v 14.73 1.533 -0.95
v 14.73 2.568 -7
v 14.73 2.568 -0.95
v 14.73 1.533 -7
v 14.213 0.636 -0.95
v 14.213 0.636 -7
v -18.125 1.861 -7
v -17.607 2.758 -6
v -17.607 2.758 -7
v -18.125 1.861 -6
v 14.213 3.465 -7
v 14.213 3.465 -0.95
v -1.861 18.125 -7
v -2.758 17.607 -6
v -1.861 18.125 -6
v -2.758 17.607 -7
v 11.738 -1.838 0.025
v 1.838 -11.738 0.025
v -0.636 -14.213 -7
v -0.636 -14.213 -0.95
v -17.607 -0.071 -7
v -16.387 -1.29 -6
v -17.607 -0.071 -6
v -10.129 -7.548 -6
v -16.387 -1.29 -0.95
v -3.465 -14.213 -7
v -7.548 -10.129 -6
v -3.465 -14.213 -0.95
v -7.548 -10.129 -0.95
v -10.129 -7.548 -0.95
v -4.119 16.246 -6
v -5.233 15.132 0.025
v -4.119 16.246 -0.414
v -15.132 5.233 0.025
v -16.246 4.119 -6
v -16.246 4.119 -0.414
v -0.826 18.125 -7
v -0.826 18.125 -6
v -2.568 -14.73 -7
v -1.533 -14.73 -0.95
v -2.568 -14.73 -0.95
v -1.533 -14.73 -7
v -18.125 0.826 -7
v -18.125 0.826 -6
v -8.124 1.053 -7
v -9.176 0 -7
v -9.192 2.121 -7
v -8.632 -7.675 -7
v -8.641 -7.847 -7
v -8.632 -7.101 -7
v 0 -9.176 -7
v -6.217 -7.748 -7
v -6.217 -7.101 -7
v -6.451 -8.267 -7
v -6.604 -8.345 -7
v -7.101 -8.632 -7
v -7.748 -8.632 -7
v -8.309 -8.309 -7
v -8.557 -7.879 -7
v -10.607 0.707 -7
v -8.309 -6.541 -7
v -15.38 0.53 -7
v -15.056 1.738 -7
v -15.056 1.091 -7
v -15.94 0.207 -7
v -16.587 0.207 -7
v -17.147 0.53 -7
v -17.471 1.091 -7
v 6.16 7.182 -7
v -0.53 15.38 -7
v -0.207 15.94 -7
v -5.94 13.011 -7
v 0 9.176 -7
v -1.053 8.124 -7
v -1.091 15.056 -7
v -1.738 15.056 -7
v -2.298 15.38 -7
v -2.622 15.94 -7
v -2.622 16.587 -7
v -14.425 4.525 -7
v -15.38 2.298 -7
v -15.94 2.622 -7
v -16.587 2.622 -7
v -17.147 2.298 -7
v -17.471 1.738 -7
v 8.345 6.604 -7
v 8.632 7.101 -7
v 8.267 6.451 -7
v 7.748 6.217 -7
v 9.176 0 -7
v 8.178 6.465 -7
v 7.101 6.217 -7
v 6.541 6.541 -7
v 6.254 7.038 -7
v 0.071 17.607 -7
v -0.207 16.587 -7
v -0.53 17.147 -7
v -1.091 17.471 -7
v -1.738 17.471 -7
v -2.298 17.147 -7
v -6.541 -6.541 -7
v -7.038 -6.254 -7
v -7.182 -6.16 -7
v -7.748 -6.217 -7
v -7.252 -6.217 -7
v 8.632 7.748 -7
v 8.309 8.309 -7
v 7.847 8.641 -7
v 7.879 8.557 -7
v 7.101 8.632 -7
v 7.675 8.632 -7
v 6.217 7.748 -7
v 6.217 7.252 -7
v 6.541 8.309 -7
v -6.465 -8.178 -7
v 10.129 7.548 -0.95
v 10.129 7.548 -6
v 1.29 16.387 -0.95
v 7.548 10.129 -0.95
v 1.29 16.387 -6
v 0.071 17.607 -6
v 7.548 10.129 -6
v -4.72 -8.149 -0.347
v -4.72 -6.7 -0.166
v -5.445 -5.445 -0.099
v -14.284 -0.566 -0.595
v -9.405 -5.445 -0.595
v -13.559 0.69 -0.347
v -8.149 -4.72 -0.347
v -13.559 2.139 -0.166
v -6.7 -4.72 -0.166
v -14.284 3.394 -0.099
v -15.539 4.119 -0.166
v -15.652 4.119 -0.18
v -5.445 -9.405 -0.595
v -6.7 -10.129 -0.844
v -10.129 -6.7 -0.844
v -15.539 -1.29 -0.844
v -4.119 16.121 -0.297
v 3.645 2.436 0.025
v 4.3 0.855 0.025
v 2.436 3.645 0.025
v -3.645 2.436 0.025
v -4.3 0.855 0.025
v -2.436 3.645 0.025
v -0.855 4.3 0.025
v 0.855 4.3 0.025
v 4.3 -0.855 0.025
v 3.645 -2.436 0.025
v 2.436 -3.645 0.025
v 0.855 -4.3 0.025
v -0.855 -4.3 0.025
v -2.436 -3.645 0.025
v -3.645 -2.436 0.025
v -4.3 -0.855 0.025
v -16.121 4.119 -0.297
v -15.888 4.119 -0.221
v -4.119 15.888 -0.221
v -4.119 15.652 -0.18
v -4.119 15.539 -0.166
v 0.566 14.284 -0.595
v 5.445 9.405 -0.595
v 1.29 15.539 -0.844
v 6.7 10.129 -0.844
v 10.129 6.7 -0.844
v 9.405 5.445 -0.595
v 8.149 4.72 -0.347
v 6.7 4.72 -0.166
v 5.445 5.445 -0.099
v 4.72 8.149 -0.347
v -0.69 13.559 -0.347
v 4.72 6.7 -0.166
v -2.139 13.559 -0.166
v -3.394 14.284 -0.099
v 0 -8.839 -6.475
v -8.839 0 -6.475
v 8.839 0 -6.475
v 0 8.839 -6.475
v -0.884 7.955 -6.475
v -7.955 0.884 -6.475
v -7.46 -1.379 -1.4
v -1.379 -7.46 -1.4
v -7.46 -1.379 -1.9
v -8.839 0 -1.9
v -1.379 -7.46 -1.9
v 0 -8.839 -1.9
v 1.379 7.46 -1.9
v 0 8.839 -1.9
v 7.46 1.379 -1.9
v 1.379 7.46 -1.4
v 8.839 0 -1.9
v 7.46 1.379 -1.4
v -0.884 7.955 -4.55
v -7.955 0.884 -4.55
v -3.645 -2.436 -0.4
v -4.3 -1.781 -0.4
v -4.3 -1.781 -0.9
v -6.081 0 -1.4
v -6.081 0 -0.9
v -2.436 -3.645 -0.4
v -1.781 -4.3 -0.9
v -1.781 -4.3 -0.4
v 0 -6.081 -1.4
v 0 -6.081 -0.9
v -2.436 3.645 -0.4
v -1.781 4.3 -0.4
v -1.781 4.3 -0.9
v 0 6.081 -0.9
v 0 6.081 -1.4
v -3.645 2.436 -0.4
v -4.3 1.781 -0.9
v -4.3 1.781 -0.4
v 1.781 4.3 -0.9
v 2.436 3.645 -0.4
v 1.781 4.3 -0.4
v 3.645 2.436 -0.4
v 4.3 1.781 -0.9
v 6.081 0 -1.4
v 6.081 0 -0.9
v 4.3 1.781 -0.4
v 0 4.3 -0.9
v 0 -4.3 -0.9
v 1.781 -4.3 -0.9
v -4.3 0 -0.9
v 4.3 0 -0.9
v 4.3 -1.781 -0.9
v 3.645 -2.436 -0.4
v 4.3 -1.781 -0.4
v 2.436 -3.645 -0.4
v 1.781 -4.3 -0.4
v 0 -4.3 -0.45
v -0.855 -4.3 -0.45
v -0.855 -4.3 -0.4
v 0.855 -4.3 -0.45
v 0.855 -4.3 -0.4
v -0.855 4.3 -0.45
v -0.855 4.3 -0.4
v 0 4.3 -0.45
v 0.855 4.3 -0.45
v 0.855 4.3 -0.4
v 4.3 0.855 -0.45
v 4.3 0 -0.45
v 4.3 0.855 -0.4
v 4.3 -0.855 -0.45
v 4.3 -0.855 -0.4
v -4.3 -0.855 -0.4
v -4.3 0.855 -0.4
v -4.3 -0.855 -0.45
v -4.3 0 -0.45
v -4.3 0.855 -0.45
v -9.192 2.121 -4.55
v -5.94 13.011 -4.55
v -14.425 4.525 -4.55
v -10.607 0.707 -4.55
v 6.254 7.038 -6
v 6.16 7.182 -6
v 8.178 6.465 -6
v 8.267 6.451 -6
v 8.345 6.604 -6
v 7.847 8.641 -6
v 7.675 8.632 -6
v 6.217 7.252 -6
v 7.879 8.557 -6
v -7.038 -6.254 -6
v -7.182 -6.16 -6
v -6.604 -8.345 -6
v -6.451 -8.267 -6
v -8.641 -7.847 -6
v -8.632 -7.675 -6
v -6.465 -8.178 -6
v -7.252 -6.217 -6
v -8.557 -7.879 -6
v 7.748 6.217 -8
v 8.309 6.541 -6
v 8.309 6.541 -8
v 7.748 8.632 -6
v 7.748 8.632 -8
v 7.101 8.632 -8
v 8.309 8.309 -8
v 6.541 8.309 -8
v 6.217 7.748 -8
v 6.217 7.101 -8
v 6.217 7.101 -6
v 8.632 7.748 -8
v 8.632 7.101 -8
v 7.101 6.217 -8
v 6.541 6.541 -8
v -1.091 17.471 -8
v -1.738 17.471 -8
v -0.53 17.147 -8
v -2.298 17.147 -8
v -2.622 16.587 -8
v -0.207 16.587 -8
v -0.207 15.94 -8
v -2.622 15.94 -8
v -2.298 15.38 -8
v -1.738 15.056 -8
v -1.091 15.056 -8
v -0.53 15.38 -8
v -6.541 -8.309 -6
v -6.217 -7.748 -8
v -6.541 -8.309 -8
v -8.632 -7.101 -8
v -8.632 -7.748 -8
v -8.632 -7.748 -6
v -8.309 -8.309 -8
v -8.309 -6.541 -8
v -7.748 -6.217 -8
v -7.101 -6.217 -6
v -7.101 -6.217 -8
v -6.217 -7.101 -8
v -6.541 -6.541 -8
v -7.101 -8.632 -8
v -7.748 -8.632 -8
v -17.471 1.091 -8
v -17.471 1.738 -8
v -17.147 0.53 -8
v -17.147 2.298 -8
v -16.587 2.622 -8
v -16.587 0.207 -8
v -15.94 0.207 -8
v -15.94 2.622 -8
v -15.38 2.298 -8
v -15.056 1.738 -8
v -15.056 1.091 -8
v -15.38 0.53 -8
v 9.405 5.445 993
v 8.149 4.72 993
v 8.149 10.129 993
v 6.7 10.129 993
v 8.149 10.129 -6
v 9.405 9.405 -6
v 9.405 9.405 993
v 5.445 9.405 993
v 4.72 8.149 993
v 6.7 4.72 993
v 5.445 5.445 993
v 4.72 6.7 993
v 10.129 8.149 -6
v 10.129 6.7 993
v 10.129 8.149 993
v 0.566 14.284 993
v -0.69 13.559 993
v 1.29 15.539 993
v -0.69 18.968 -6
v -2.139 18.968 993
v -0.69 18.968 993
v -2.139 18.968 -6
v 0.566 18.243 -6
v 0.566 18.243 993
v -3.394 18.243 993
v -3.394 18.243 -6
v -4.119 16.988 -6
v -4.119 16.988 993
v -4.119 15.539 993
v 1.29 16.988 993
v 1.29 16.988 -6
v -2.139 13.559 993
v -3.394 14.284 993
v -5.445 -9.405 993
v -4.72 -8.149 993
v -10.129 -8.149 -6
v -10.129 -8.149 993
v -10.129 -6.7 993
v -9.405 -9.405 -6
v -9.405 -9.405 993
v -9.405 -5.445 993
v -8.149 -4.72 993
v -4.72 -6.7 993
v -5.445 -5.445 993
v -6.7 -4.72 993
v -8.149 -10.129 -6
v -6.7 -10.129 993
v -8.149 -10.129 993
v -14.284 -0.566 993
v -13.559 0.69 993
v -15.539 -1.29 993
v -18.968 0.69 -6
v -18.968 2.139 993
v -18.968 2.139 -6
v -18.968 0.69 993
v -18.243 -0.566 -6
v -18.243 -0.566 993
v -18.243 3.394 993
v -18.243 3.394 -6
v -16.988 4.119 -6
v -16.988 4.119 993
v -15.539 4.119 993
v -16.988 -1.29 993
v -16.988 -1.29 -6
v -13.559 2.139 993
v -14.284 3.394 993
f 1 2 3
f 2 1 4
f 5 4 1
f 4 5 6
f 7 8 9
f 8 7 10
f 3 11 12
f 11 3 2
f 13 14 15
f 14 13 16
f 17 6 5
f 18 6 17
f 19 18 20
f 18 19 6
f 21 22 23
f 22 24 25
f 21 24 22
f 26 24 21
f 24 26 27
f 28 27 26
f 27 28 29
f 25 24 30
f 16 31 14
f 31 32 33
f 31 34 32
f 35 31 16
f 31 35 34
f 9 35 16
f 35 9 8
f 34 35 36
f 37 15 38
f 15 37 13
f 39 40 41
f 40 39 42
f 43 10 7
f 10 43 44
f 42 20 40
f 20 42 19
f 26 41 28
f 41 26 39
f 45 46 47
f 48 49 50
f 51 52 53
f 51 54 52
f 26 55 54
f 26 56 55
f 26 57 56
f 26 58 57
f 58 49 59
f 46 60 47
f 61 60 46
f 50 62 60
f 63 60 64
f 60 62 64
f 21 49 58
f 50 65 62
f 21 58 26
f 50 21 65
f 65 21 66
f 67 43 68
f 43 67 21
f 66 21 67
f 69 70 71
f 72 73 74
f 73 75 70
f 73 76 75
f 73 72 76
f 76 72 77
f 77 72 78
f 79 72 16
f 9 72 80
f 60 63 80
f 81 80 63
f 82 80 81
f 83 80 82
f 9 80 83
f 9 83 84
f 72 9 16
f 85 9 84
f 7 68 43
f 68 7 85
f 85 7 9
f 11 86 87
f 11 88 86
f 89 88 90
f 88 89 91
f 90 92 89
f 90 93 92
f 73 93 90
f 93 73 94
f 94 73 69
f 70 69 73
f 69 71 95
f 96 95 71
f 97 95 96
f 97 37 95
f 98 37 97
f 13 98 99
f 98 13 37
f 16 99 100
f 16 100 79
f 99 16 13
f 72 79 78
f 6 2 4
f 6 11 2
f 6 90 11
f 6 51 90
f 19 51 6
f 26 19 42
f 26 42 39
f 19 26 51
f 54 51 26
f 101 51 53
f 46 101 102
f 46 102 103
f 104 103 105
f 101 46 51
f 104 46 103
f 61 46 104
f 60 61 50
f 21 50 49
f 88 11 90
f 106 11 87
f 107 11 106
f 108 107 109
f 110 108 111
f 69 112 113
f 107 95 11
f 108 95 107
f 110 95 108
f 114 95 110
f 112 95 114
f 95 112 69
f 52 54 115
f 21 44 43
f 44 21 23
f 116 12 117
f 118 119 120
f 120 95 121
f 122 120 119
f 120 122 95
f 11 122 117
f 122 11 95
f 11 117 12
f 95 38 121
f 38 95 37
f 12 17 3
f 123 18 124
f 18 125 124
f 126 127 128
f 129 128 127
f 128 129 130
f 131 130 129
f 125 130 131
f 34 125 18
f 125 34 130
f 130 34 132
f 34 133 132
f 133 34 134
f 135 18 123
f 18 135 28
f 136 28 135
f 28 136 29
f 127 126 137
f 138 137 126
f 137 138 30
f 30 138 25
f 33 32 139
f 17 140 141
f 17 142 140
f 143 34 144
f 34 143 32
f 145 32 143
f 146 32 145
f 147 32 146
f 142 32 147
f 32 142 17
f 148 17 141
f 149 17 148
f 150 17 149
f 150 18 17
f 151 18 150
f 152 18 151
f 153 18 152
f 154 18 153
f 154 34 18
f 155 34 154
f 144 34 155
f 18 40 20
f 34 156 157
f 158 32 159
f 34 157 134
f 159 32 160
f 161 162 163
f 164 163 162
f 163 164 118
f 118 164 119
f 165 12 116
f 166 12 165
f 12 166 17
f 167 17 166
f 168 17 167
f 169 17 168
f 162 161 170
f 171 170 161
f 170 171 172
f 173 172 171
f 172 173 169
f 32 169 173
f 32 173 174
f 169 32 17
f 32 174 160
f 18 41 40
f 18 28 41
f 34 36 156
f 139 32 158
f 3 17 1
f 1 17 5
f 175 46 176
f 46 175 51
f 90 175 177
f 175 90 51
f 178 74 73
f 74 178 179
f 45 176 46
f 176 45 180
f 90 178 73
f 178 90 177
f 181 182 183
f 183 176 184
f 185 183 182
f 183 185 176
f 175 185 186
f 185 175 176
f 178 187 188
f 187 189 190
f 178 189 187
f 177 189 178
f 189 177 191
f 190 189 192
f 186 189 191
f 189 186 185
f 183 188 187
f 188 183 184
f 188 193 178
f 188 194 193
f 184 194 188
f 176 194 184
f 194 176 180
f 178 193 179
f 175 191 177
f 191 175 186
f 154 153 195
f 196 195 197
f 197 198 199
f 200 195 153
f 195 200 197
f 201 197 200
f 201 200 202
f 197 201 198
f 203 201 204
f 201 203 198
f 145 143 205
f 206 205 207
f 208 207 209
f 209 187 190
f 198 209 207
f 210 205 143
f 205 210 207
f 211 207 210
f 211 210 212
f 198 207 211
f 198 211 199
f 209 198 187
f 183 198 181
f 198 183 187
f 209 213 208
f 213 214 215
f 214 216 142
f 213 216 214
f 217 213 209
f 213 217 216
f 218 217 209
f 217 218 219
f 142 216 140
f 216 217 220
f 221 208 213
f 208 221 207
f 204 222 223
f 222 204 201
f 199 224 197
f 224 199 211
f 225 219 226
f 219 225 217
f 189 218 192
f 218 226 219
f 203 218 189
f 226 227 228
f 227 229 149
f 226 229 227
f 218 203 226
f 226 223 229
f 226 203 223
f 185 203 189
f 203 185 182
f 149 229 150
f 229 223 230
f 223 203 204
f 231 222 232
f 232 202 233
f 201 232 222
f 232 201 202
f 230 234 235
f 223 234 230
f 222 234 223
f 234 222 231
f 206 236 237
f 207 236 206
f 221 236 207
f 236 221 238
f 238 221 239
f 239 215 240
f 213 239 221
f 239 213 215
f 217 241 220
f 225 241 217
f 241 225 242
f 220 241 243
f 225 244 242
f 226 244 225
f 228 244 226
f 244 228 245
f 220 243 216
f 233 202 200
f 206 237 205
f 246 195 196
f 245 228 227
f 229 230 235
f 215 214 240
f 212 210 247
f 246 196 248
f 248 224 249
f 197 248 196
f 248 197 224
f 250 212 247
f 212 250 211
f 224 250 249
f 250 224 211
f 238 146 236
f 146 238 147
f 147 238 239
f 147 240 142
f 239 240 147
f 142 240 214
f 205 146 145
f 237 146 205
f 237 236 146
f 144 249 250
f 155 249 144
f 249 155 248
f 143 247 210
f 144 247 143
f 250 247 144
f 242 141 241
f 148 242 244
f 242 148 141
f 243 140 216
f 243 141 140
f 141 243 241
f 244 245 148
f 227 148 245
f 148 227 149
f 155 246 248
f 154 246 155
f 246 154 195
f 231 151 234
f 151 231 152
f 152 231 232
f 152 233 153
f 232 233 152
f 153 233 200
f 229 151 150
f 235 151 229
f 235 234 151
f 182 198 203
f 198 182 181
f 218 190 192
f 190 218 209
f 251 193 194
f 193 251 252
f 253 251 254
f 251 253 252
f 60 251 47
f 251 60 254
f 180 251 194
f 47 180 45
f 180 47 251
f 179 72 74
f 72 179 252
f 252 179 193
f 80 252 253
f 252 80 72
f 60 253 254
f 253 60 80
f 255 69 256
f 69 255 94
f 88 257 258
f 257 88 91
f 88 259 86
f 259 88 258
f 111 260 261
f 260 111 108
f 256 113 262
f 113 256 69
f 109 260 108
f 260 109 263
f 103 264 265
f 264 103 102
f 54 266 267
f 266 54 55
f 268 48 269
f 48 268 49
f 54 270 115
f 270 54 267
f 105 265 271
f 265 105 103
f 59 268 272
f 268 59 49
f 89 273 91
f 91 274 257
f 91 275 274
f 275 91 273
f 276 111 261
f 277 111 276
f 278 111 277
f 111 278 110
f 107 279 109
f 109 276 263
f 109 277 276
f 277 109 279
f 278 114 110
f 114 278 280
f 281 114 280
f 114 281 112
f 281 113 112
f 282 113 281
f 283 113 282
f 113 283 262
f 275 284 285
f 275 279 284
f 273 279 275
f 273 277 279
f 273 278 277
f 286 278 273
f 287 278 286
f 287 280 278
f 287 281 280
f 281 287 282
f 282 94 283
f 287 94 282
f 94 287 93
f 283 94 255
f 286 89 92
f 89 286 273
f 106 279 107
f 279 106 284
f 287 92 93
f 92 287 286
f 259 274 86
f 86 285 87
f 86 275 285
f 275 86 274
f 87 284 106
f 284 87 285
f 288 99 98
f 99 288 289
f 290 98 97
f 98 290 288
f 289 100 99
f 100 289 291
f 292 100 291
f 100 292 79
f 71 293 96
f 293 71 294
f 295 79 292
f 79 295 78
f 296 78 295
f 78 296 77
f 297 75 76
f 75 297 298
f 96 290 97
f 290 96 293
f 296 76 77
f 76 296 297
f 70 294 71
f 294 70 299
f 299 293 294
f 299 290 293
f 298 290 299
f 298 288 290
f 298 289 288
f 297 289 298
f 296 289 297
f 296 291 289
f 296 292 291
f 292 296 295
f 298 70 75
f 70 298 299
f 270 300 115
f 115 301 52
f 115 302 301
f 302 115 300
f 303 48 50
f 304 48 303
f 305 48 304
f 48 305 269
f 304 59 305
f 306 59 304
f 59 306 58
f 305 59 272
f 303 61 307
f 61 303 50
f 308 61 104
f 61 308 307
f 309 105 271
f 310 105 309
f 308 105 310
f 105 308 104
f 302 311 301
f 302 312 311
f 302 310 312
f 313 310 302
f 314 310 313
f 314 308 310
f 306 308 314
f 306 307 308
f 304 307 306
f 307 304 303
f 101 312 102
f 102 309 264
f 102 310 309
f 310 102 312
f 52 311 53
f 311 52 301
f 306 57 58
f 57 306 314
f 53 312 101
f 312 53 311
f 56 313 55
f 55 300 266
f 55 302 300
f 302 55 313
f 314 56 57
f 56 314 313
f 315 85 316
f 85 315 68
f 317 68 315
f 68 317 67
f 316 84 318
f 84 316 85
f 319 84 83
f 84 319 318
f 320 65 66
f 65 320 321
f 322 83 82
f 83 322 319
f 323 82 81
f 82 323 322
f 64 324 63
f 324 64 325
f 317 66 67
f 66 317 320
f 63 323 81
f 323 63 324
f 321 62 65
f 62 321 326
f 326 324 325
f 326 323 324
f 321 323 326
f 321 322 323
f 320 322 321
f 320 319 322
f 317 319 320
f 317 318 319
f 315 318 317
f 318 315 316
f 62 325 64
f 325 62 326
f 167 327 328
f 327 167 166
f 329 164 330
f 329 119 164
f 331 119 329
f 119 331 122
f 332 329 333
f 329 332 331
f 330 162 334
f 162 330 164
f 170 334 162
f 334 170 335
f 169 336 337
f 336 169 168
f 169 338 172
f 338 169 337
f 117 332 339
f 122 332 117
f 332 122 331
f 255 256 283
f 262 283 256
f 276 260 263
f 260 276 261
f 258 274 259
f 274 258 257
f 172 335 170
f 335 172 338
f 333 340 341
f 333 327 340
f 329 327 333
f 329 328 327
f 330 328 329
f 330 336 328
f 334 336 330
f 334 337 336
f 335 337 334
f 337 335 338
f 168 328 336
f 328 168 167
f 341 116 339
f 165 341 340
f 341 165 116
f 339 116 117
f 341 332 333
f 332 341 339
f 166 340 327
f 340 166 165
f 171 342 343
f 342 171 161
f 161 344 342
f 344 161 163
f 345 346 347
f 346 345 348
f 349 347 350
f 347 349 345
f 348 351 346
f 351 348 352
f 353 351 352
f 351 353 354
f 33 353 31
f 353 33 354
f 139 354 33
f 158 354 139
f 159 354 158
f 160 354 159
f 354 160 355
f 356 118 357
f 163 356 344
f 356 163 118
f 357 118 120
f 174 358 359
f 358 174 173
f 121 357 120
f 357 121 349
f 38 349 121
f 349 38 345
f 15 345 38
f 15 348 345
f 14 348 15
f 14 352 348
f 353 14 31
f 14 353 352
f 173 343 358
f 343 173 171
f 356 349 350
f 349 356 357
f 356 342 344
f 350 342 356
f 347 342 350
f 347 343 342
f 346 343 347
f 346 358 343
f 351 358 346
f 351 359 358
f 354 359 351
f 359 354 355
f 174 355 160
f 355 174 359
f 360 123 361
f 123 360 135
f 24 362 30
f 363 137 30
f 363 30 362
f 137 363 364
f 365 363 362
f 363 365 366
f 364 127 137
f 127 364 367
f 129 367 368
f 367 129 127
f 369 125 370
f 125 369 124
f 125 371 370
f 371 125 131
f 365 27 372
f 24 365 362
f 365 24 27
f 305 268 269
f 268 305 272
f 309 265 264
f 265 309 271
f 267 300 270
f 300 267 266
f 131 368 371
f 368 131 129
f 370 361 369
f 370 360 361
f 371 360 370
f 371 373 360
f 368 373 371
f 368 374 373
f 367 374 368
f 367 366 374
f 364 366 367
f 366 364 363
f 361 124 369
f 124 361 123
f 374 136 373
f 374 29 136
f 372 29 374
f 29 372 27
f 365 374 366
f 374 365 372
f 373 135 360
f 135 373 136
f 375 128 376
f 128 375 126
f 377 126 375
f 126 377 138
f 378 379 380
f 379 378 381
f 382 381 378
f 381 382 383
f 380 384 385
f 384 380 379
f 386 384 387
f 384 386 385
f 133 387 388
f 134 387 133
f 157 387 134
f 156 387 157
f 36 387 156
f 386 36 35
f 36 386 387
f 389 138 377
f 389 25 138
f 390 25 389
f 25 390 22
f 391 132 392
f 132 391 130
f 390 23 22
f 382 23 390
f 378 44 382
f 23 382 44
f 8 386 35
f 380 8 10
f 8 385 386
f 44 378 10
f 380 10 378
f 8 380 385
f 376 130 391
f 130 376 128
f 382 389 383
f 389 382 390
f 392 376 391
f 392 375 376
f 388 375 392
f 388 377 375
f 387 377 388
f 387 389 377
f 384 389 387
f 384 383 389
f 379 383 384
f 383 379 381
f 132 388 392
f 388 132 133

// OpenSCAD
// file: ../libdict.scad
// This library add dictionary like features to openscad
// the dictionary is a list of pairs as we cannot define new types.
// Unlike a python dictionary we cannot do a proper hash table for speed
// so everything is build around the OpenSCAD search function
// There are a lot of assert statements to ensure data in the "dictionary"
// is in the format of
// * A list of lists
// * Each internal list has a length of two
// * First element of each internal list is a string (the key)
// * All keys are unique.


// Private function:
// This function returns true if the value is in the list
// value must be a string.
// No error checking, for use by is_in only!
function _is_in_str(value, list) =
    search([value], list) != [[]];

// Private function:
// This function returns true if the value is in the list
// value must be a number.
// No error checking, for use by is_in only!
function _is_in_num(value, list) =
    search(value, list) != [];


// This function returns true if the value is in the list
// value must be a string or a number.
function is_in(value, list) =
    assert(is_num(value) || is_string(value) , "is_in: value must be a number or string")
    assert(is_list(list), "is_in: list must be a list")
    is_num(value) ? _is_in_num(value, list) : _is_in_str(value, list);

/**
 * Sum a list
 * This recursive function sums a list.  It should be called with one
 * argument (the list); the other two arguments simply allow it to be
 * "tail-recursive" which lets OpenSCAD optimise it better.  This is
 * very close to the example given in the OpenSCAD docs.
 */
function _libdict_sum_list(list, starting_element=0, running_total=0) =
    starting_element >= len(list) ?
        running_total :
        _libdict_sum_list(list, starting_element + 1, running_total + list[starting_element]);

/**
 * When checking a list for uniqueness, we can get "errant matches".
 * An errant match is when a non-list matches with the first element in a list.
 * i.e. it would consider [1, [1,0]] to be non-unique. We cannot know which 
 * element is the non-list but we do know that it is errant if exactly one 
 * of them is not a list.
 * If two elements are non-lists, they must be identical in order to have matched.  
 * Similarly, if all elements are lists, they must be identical because ``search`` 
 * will have matched them as whole lists.
 * The argument "list" is the list we are checking for uniqueness, and "match" is 
 * a vector of indices that have been returned by ``search``.
 */
function _check_errant_match(list, match) = let(
    non_list = [for (m = match) is_list(list[m])? 0 : 1],
    number_of_non_lists = _libdict_sum_list(non_list)
) number_of_non_lists == 1 ? 0 : 1;

// Returns true if all emements in list are unique.
function is_unique(list) =
    assert(is_list(list), "is_unique: list must be a list")
    let(
        matches = search(list, list, 0),
        // Assign 1 or 0 depending on is the match length for each element
        // return wether any matches are greater than one (mathcing more than
        // itself)
        // note cannot search for true or false so using 1 and zero
        bool_list = [for (match = matches) if (len(match)==1) 0
            // should put a 1 here to show they matched but in the case of
            // [1, [1]] it will match both, so need to check if they are
            // both lists or both not list
            else _check_errant_match(list, match)]
    ) !is_in(1, bool_list);

// Private function:
// Checks that the input is a list and that every element is a list
// of length 2.
// No error checking, for use by valid_dict only!
function _is_pairs(list) =
    !is_list(list) ? false :
        len(list)==0 ? false :
            !is_in(0, [for (pair = list) is_list(pair) && len(pair)==2 ? 1: 0]);

// Private function:
// Checks all elements in the list are strings
// No error checking, for use by valid_dict only!
// Strings can't be empty
function _is_list_of_strings(list) =
    !is_in(0, [for (item = list) is_string(item) && len(item)>0 ? 1: 0]);

// Private function:
// Returns the keus in a dictionary
// No error checking, for use by valid_dict only!
function _keylist(dict)  = [for (pair=dict) pair[0]];

function valid_dict(dict) =
    //if the input are not pairs return instantly
    !_is_pairs(dict) ? false : let (
        //if they are pairs get all keys
        keys = _keylist(dict),
        all_strings =  _is_list_of_strings(keys),
        unique = is_unique(keys)
    ) (all_strings && unique) ? true : false;

// Key lookup for key value pair "dictionary".
// Unlike the built in lookup this works with strings.
function key_lookup(key, dict) =
    assert(is_string(key), "`key` must be a string")
    assert(valid_dict(dict), "`dict` must be a valid 'dictionary'")
    let(
        // key is in [] because otherwise openscad will search for each letter rather than the string.
        index = search([key], dict, 1, 0)[0]
    )  assert (index!=[], "Key lookup failed, key not found!") dict[index][1];

// Creates a new dictionary with a key value pair replaced. Pair must already
// be in dictionary.
function replace_value(key, value, dict) =
    assert(is_string(key), "`key` must be a string")
    assert(valid_dict(dict), "`dict` must be a valid 'dictionary'")
    assert(is_in(key, _keylist(dict)), "`key` not found in dictionary!")
    [for (kv_pair = dict) key!=kv_pair[0] ? kv_pair : [key, value]];


// Creates a new dictionary with a a set of key value pair replaced
// both inputs must be a dictionary. All keys in input must already be
// in dictionary
function replace_multiple_values(rep_dict, dict) =
    assert(valid_dict(rep_dict), "`rep dict` must be a valid 'dictionary'")
    assert(valid_dict(dict), "`dict` must be a valid 'dictionary'")
    let(
        // loop over all keys in replacement dict checking they are in the original
        rep_keys = [for (key = _keylist(rep_dict))
            assert(is_in(key, _keylist(dict)), "`key` not found in dictionary!")
            key
        ]
    ) //Finally return the updated dictionary using this long list comprehension.
    [
        for (kv_pair = dict) let(
            key = kv_pair[0],
            // check if this key is in the replacement dictionary and if so return index
            // key is in [] because otherwise openscad will search for each letter rather
            // than the string.
            index = search([key], rep_dict, 1, 0)[0]
            // if index is empty return original key value pair, else return the key with
            // the replaced value
        ) index == [] ? kv_pair : [key, rep_dict[index][1]]
    ];
// main file
/******************************************************************
*                                                                 *
* OpenFlexure Microscope: Raspberry Pi Camera v2 push-fit mount   *
*                                                                 *
* This is part of the OpenFlexure microscope, an open-source      *
* microscope and 3-axis translation stage.  It gets really good   *
* precision over a ~10mm range, by using plastic flexure          *
* mechanisms.                                                     *
*                                                                 *
* This file provides two parts for the microscope; the bit that   *
* fits onto the camera (picam2_camera_mount) and a cover that     *
* protects the PCB (picam_cover).  The former is part of the      *
* optics module in optics.scad, and the latter is printed         *
* directly.                                                       *
*                                                                 *
* The fit is set by one main function, picam2_push_fit().  It's   *
* designed to be subtracted from a solid block, with the bottom   *
* of the block at z=0.  It grips the plastic camera housing with  *
* four slightly flexible fingers, which ensures the camera pops   *
* in easily but is held relatively firmly.  Two screw holes are   *
* also provided that should self-tap with M2 or similar screws.   *
* I recommend you use these for extra security if the camera is   *
* likely to be handled a lot.                                     *
*                                                                 *
* (c) Richard Bowman, January 2016                                *
* Released under the CERN Open Hardware License                   *
*                                                                 *
******************************************************************/


use <../utilities.scad>
use <../libdict.scad>

function picamera_3_camera_dict() = [["mount_height", 7], // height of the basic camera mount, camera height from the board (5mm) plus 2mm
                                     ["sensor_height", 2]];//Height of the sensor above the PCB

function picamera_3_bottom_z() = -key_lookup("mount_height", picamera_3_camera_dict());

function picamera_3_hole_spacing() = 21;

//picam3_flex_and_components(camera_width=11+1);

// module picam3_flex_and_components(camera_width=11.5+1){
//     // A 2D perimeter inside which the flex and components of the camera sit.
//     // 
//     // camera_width is the width of the camera module's casing, nominally 11 or 11.5mm but
//     // deliberately printed a bit generous to ensure it fits easily without
//     // damaging the flex.

//     //flex 
//     translate([-camera_width/2,camera_width/2-1]){
//         square([camera_width,13.4-camera_width/2+1]);
//     }
//     //connector
//     translate([-camera_width/2-2.5,6.7]){
//         square([camera_width+2.5, 5.4]);
//     }
// }

module picam3_flex_and_components(){
    // A 2D perimeter inside which the flex and components of the camera sit.
    // 
    
    //flex 
    translate([-10/2,4]){
        square([10,13.4-4]);
    }
    //connector
    translate([-10/2-2,13.4-5.4]){
        square([12, 5.4]);
    }
}

// difference(){
//     translate_z(15){
//         cube(30, center=true);
//     }
//     picam3_cutout( beam_length=15);
// }

module picam3_cutout( beam_length=15){
    // This module is designed to be subtracted from the bottom of a shape.
    // The z=0 plane should be the print bed.
    // It includes cut-outs for the components on the PCB and also a push-fit hole
    // for the camera module.  This uses flexible "fingers" to grip the camera firmly
    // but gently.  Just push to insert, and wiggle to remove.  You may find popping
    // off the brown ribbon cable and removing the PCB first helps when extracting
    // the camera module again.

    mount_height = key_lookup("mount_height", picamera_3_camera_dict());
    //width camera box (NOTE: this is deliberately loose fitting)
    camera_width = 11.5 + 1.0;
    //height of camera box (including foam support)
    camera_height=5.1;

    //size of camera aperture
    hole_r = 4.3;
    union(){
        sequential_hull(){
            //cut-out for camera (/wider at bottom)
            translate_z(-tiny()){
                cube([camera_width+0.5,camera_width+0.5,tiny()],center=true);
            }
            translate_z(0.5){
                cube([camera_width,camera_width,tiny()],center=true);
            }
            translate_z(camera_height/2){
                cube([camera_width,camera_width,camera_height],center=true);
            }
            //cylinder(r=hole_r, h=2*mount_height, center=true);
        }
        // transition from teh square camera mount to a cylindrical optical cut-out
        translate_z(camera_height){
            hole_from_bottom(r=hole_r, h=2*mount_height, base_w=camera_width, delta_z=0.5, layers=4, big_bottom=false);
        }

        //clearance for the ribbon cable at top of camera
        flex_h=2.5; // the height of the flex

        extra_h = mount_height-flex_h-0.75; // extra height above the flex for the sloping "roof"
        //hull(){
            translate_z(-tiny()){
                linear_extrude(flex_h){
                    // picam3_flex_and_components(9.5+0*camera_width);
                    picam3_flex_and_components();
                }
            }
            // #translate_z(-tiny()){
            //     linear_extrude(flex_h+extra_h){
            //         offset(-extra_h){
            //             picam3_flex_and_components(camera_width);
            //         }
            //     }
            // }
            //cylinder(r=hole_r, h=2*mount_height, center=true);
        //}

        //clearance for the LED/resistor on v1 of the camera
        // hull(){
        //     translate_z(-tiny()){
        //         linear_extrude(flex_h){
        //             picam1_led();
        //         }
        //     }
        //     translate_z(-tiny()){
        //         linear_extrude(flex_h+extra_h){
        //             offset(-extra_h){
        //                 picam1_led();
        //             }
        //         }
        //     }
        // }

        //beam clearance
        cylinder(r=hole_r, h=beam_length);

    }
}
picamera_3_camera_mount();
#picamera_3_counterbore();

module picam2_board(h=tiny()){
    // a rounded rectangle with the dimensions of the picamera board v2
    // centred on the origin
    b = 24;
    w = 25;
    roc = 2;
    linear_extrude(h){
        hull(){
            reflect([1,0]){
                reflect([0,1]){
                    translate([w/2-roc, b/2-roc]){
                        circle(r=roc,$fn=12);
                    }
                }
            }
        }
    }
}

module picamera_3_camera_mount(screwhole=true, counterbore=false){
    // A mount for the pi camera module 3
    // This should finish at z=0+tiny(), with a surface that can be
    // hull-ed onto the lens assembly.
    b = 24;
    w = 25;
    difference(){
        rotate(45){
            translate_y(2.4){
                sequential_hull(){
                    translate_z(picamera_3_bottom_z()){
                        picam2_board(h=tiny());
                    }
                    translate_z(-1){
                        picam2_board(h=tiny());
                    }
                    cube([w-(-1.5-picamera_3_bottom_z())*2,b,tiny()],center=true);
                }
            }
        }
        rotate(45){
            translate_z(picamera_3_bottom_z()){
                picam3_cutout();
            }
        }
        if(counterbore){
            picamera_3_counterbore();
        }
        if(screwhole){
            picamera_3_screwholes();
        }
    }
}

module picamera_3_screwholes(){
    //chamfered screw holes for mounting
    screw_x = picamera_3_hole_spacing()/2;
    rotate_z(45){
        translate_z(picamera_3_bottom_z()){
            reflect_x(){
                translate_x(screw_x){
                    rotate_z(60){
                        translate_z(-tiny()){
                            no2_selftap_hole(h=10);
                        }
                    }
                }
            }
        }
    }
}

module picamera_3_counterbore(){
    translate_z(picamera_3_bottom_z()-1){
        picamera_3_bottom_mounting_posts(height=999, radius=1.25, cutouts=false);
    }
    translate_z(picamera_3_bottom_z()+1){
        picamera_3_bottom_mounting_posts(height=999, radius=2.8, cutouts=false);
    }
}

module picamera_3_bottom_mounting_posts(height=-1, radius=-1, outers=true, cutouts=true){
    // posts to mount to pi camera from below
    r = radius > 0 ? radius : 2;
    h = height > 0 ? height : 4;
    screw_x = picamera_3_hole_spacing()/2;
    rotate(45){
        reflect_x(){
            for(y=[0,12.5]){
                translate([screw_x, y, 0]){
                    difference(){
                        if(outers){
                            cylinder(r=r, h=h, $fn=12);
                        }
                        if(cutouts){
                            translate_z(h-6+tiny()){
                                no2_selftap_hole(h=6);
                            }
                        }
                    }
                }
            }
        }
    }
}

/////////// Cover for camera board //////////////
module picamera_3_cover(){
    // A cover for the camera PCB, slips over the bottom of the camera
    // mount.  This version should be compatible with v1 and v2 of the board
    h = 3;
    outer_size = [25, 21, h];
    //wall thickness
    t = 1;
    //position of the outer edge in y
    edge_y = 14.4;
    screw_x = picamera_3_hole_spacing()/2;
    box_tr = [-outer_size.x/2, edge_y-outer_size.y, 0];
    //cutout for connector is loose in x and huge in x/z
    connector_cutout = [21, 50, 50];
    //cutout should start 18mm from the back edge of the housing
    connector_y = edge_y - 18;
    difference(){
        union(){
            //bottom and sides
            difference(){
                translate(box_tr){
                    cube(outer_size);
                }
                // cut out centre to form walls on 3 sides
                translate(box_tr + [t, -t, 0.75]){
                    cube(outer_size - [2*t, 0, 0]);
                }
                // cut out for connector
                translate_y(connector_y-connector_cutout.y/2){
                    cube(connector_cutout, center=true);
                }
            }

            //Bulge for counterbore. (Slightly elongated cylinder)
            reflect_x(){
                translate_x(screw_x){
                    hull(){
                        cylinder(r=3.2, h=h, $fn=16);
                        translate_x(0.5){
                            cylinder(r=3.2, h=h, $fn=16);
                        }
                    }
                }
            }
        }
        //counterbore the mounting screws
        reflect_x(){
            translate([screw_x, 0, h-2]){
                intersection(){
                    cylinder(r=2.4, h=999, $fn=16, center=true);
                    hole_from_bottom(r=1.3, h=999, base_w=999, layers=2);
                }
            }
        }
    }
}


module generous_camera_bits(){
    //The other stuff on the PCB (mostly the ribbon cable)
    camera = [8.5,8.5,2.3]; //size of camera box
    camera_width = camera.x+1; //side length of camera box at bottom (slightly larger)
    union(){
        //ribbon cable at top of camera
        sequential_hull(){
            cube([camera_width-1,tiny(),4],center=true);
            translate_y(9.4-(4.4/1)/2){
                cube([camera_width-1,1,4],center=true);
            }
        }
        //flex connector
        translate([-1.25,9.4,0]){
            cube([camera_width-1+2.5, 4.4+1, 4],center=true);
        }
    }
}

module picamera_2_gripper(){
    // this little bit of plastic grips the plastic camera housing
    // and allows you to safely unscrew the lens
    // it protects the (surprisingly delicate) flex that connects the camera to the PCB.

    //size of the picam PCB (+0.5mm so it fits)
    pcb_dims = [25.4+0.5,24+0.5,2];
    //size of the pastic housing
    camera_housing = [9,9,2.5];
    //shift of the camera housing from the centre
    camera_housing_y_shift = 2.5;

    //size of the tool
    outer = pcb_dims+[4,-5,camera_housing.z];
    difference(){
        translate([0,-1,outer.z/2]){
            cube(outer, center=true);
        }

        //central hole for the camera housing
        translate_y(camera_housing_y_shift){
            cube(camera_housing + [0,0,999],center=true);
        }

        //cut-outs for the other bits (cable etc.)
        translate([0, camera_housing_y_shift, camera_housing.z]){
            rotate_x(180){
                generous_camera_bits();
            }
        }

        //indent for PCB
        translate_z(outer.z){
            cube(pcb_dims + [0,0,pcb_dims.z],center=true);
        }
    }
}

module picamera_2_lens_gripper(){
    //a tool to unscrew the lens from the pi camera
    inner_r = 4.7/2;
    union(){
        difference(){
            cylinder(r=7,h=2);
            cylinder(r=5,h=999,center=true);
        }
        for(a=[0,90,180,270]){
            rotate(a){
                translate_x(inner_r){
                    cube([1.5,5,2]);
                }
            }
        }
    }
}
